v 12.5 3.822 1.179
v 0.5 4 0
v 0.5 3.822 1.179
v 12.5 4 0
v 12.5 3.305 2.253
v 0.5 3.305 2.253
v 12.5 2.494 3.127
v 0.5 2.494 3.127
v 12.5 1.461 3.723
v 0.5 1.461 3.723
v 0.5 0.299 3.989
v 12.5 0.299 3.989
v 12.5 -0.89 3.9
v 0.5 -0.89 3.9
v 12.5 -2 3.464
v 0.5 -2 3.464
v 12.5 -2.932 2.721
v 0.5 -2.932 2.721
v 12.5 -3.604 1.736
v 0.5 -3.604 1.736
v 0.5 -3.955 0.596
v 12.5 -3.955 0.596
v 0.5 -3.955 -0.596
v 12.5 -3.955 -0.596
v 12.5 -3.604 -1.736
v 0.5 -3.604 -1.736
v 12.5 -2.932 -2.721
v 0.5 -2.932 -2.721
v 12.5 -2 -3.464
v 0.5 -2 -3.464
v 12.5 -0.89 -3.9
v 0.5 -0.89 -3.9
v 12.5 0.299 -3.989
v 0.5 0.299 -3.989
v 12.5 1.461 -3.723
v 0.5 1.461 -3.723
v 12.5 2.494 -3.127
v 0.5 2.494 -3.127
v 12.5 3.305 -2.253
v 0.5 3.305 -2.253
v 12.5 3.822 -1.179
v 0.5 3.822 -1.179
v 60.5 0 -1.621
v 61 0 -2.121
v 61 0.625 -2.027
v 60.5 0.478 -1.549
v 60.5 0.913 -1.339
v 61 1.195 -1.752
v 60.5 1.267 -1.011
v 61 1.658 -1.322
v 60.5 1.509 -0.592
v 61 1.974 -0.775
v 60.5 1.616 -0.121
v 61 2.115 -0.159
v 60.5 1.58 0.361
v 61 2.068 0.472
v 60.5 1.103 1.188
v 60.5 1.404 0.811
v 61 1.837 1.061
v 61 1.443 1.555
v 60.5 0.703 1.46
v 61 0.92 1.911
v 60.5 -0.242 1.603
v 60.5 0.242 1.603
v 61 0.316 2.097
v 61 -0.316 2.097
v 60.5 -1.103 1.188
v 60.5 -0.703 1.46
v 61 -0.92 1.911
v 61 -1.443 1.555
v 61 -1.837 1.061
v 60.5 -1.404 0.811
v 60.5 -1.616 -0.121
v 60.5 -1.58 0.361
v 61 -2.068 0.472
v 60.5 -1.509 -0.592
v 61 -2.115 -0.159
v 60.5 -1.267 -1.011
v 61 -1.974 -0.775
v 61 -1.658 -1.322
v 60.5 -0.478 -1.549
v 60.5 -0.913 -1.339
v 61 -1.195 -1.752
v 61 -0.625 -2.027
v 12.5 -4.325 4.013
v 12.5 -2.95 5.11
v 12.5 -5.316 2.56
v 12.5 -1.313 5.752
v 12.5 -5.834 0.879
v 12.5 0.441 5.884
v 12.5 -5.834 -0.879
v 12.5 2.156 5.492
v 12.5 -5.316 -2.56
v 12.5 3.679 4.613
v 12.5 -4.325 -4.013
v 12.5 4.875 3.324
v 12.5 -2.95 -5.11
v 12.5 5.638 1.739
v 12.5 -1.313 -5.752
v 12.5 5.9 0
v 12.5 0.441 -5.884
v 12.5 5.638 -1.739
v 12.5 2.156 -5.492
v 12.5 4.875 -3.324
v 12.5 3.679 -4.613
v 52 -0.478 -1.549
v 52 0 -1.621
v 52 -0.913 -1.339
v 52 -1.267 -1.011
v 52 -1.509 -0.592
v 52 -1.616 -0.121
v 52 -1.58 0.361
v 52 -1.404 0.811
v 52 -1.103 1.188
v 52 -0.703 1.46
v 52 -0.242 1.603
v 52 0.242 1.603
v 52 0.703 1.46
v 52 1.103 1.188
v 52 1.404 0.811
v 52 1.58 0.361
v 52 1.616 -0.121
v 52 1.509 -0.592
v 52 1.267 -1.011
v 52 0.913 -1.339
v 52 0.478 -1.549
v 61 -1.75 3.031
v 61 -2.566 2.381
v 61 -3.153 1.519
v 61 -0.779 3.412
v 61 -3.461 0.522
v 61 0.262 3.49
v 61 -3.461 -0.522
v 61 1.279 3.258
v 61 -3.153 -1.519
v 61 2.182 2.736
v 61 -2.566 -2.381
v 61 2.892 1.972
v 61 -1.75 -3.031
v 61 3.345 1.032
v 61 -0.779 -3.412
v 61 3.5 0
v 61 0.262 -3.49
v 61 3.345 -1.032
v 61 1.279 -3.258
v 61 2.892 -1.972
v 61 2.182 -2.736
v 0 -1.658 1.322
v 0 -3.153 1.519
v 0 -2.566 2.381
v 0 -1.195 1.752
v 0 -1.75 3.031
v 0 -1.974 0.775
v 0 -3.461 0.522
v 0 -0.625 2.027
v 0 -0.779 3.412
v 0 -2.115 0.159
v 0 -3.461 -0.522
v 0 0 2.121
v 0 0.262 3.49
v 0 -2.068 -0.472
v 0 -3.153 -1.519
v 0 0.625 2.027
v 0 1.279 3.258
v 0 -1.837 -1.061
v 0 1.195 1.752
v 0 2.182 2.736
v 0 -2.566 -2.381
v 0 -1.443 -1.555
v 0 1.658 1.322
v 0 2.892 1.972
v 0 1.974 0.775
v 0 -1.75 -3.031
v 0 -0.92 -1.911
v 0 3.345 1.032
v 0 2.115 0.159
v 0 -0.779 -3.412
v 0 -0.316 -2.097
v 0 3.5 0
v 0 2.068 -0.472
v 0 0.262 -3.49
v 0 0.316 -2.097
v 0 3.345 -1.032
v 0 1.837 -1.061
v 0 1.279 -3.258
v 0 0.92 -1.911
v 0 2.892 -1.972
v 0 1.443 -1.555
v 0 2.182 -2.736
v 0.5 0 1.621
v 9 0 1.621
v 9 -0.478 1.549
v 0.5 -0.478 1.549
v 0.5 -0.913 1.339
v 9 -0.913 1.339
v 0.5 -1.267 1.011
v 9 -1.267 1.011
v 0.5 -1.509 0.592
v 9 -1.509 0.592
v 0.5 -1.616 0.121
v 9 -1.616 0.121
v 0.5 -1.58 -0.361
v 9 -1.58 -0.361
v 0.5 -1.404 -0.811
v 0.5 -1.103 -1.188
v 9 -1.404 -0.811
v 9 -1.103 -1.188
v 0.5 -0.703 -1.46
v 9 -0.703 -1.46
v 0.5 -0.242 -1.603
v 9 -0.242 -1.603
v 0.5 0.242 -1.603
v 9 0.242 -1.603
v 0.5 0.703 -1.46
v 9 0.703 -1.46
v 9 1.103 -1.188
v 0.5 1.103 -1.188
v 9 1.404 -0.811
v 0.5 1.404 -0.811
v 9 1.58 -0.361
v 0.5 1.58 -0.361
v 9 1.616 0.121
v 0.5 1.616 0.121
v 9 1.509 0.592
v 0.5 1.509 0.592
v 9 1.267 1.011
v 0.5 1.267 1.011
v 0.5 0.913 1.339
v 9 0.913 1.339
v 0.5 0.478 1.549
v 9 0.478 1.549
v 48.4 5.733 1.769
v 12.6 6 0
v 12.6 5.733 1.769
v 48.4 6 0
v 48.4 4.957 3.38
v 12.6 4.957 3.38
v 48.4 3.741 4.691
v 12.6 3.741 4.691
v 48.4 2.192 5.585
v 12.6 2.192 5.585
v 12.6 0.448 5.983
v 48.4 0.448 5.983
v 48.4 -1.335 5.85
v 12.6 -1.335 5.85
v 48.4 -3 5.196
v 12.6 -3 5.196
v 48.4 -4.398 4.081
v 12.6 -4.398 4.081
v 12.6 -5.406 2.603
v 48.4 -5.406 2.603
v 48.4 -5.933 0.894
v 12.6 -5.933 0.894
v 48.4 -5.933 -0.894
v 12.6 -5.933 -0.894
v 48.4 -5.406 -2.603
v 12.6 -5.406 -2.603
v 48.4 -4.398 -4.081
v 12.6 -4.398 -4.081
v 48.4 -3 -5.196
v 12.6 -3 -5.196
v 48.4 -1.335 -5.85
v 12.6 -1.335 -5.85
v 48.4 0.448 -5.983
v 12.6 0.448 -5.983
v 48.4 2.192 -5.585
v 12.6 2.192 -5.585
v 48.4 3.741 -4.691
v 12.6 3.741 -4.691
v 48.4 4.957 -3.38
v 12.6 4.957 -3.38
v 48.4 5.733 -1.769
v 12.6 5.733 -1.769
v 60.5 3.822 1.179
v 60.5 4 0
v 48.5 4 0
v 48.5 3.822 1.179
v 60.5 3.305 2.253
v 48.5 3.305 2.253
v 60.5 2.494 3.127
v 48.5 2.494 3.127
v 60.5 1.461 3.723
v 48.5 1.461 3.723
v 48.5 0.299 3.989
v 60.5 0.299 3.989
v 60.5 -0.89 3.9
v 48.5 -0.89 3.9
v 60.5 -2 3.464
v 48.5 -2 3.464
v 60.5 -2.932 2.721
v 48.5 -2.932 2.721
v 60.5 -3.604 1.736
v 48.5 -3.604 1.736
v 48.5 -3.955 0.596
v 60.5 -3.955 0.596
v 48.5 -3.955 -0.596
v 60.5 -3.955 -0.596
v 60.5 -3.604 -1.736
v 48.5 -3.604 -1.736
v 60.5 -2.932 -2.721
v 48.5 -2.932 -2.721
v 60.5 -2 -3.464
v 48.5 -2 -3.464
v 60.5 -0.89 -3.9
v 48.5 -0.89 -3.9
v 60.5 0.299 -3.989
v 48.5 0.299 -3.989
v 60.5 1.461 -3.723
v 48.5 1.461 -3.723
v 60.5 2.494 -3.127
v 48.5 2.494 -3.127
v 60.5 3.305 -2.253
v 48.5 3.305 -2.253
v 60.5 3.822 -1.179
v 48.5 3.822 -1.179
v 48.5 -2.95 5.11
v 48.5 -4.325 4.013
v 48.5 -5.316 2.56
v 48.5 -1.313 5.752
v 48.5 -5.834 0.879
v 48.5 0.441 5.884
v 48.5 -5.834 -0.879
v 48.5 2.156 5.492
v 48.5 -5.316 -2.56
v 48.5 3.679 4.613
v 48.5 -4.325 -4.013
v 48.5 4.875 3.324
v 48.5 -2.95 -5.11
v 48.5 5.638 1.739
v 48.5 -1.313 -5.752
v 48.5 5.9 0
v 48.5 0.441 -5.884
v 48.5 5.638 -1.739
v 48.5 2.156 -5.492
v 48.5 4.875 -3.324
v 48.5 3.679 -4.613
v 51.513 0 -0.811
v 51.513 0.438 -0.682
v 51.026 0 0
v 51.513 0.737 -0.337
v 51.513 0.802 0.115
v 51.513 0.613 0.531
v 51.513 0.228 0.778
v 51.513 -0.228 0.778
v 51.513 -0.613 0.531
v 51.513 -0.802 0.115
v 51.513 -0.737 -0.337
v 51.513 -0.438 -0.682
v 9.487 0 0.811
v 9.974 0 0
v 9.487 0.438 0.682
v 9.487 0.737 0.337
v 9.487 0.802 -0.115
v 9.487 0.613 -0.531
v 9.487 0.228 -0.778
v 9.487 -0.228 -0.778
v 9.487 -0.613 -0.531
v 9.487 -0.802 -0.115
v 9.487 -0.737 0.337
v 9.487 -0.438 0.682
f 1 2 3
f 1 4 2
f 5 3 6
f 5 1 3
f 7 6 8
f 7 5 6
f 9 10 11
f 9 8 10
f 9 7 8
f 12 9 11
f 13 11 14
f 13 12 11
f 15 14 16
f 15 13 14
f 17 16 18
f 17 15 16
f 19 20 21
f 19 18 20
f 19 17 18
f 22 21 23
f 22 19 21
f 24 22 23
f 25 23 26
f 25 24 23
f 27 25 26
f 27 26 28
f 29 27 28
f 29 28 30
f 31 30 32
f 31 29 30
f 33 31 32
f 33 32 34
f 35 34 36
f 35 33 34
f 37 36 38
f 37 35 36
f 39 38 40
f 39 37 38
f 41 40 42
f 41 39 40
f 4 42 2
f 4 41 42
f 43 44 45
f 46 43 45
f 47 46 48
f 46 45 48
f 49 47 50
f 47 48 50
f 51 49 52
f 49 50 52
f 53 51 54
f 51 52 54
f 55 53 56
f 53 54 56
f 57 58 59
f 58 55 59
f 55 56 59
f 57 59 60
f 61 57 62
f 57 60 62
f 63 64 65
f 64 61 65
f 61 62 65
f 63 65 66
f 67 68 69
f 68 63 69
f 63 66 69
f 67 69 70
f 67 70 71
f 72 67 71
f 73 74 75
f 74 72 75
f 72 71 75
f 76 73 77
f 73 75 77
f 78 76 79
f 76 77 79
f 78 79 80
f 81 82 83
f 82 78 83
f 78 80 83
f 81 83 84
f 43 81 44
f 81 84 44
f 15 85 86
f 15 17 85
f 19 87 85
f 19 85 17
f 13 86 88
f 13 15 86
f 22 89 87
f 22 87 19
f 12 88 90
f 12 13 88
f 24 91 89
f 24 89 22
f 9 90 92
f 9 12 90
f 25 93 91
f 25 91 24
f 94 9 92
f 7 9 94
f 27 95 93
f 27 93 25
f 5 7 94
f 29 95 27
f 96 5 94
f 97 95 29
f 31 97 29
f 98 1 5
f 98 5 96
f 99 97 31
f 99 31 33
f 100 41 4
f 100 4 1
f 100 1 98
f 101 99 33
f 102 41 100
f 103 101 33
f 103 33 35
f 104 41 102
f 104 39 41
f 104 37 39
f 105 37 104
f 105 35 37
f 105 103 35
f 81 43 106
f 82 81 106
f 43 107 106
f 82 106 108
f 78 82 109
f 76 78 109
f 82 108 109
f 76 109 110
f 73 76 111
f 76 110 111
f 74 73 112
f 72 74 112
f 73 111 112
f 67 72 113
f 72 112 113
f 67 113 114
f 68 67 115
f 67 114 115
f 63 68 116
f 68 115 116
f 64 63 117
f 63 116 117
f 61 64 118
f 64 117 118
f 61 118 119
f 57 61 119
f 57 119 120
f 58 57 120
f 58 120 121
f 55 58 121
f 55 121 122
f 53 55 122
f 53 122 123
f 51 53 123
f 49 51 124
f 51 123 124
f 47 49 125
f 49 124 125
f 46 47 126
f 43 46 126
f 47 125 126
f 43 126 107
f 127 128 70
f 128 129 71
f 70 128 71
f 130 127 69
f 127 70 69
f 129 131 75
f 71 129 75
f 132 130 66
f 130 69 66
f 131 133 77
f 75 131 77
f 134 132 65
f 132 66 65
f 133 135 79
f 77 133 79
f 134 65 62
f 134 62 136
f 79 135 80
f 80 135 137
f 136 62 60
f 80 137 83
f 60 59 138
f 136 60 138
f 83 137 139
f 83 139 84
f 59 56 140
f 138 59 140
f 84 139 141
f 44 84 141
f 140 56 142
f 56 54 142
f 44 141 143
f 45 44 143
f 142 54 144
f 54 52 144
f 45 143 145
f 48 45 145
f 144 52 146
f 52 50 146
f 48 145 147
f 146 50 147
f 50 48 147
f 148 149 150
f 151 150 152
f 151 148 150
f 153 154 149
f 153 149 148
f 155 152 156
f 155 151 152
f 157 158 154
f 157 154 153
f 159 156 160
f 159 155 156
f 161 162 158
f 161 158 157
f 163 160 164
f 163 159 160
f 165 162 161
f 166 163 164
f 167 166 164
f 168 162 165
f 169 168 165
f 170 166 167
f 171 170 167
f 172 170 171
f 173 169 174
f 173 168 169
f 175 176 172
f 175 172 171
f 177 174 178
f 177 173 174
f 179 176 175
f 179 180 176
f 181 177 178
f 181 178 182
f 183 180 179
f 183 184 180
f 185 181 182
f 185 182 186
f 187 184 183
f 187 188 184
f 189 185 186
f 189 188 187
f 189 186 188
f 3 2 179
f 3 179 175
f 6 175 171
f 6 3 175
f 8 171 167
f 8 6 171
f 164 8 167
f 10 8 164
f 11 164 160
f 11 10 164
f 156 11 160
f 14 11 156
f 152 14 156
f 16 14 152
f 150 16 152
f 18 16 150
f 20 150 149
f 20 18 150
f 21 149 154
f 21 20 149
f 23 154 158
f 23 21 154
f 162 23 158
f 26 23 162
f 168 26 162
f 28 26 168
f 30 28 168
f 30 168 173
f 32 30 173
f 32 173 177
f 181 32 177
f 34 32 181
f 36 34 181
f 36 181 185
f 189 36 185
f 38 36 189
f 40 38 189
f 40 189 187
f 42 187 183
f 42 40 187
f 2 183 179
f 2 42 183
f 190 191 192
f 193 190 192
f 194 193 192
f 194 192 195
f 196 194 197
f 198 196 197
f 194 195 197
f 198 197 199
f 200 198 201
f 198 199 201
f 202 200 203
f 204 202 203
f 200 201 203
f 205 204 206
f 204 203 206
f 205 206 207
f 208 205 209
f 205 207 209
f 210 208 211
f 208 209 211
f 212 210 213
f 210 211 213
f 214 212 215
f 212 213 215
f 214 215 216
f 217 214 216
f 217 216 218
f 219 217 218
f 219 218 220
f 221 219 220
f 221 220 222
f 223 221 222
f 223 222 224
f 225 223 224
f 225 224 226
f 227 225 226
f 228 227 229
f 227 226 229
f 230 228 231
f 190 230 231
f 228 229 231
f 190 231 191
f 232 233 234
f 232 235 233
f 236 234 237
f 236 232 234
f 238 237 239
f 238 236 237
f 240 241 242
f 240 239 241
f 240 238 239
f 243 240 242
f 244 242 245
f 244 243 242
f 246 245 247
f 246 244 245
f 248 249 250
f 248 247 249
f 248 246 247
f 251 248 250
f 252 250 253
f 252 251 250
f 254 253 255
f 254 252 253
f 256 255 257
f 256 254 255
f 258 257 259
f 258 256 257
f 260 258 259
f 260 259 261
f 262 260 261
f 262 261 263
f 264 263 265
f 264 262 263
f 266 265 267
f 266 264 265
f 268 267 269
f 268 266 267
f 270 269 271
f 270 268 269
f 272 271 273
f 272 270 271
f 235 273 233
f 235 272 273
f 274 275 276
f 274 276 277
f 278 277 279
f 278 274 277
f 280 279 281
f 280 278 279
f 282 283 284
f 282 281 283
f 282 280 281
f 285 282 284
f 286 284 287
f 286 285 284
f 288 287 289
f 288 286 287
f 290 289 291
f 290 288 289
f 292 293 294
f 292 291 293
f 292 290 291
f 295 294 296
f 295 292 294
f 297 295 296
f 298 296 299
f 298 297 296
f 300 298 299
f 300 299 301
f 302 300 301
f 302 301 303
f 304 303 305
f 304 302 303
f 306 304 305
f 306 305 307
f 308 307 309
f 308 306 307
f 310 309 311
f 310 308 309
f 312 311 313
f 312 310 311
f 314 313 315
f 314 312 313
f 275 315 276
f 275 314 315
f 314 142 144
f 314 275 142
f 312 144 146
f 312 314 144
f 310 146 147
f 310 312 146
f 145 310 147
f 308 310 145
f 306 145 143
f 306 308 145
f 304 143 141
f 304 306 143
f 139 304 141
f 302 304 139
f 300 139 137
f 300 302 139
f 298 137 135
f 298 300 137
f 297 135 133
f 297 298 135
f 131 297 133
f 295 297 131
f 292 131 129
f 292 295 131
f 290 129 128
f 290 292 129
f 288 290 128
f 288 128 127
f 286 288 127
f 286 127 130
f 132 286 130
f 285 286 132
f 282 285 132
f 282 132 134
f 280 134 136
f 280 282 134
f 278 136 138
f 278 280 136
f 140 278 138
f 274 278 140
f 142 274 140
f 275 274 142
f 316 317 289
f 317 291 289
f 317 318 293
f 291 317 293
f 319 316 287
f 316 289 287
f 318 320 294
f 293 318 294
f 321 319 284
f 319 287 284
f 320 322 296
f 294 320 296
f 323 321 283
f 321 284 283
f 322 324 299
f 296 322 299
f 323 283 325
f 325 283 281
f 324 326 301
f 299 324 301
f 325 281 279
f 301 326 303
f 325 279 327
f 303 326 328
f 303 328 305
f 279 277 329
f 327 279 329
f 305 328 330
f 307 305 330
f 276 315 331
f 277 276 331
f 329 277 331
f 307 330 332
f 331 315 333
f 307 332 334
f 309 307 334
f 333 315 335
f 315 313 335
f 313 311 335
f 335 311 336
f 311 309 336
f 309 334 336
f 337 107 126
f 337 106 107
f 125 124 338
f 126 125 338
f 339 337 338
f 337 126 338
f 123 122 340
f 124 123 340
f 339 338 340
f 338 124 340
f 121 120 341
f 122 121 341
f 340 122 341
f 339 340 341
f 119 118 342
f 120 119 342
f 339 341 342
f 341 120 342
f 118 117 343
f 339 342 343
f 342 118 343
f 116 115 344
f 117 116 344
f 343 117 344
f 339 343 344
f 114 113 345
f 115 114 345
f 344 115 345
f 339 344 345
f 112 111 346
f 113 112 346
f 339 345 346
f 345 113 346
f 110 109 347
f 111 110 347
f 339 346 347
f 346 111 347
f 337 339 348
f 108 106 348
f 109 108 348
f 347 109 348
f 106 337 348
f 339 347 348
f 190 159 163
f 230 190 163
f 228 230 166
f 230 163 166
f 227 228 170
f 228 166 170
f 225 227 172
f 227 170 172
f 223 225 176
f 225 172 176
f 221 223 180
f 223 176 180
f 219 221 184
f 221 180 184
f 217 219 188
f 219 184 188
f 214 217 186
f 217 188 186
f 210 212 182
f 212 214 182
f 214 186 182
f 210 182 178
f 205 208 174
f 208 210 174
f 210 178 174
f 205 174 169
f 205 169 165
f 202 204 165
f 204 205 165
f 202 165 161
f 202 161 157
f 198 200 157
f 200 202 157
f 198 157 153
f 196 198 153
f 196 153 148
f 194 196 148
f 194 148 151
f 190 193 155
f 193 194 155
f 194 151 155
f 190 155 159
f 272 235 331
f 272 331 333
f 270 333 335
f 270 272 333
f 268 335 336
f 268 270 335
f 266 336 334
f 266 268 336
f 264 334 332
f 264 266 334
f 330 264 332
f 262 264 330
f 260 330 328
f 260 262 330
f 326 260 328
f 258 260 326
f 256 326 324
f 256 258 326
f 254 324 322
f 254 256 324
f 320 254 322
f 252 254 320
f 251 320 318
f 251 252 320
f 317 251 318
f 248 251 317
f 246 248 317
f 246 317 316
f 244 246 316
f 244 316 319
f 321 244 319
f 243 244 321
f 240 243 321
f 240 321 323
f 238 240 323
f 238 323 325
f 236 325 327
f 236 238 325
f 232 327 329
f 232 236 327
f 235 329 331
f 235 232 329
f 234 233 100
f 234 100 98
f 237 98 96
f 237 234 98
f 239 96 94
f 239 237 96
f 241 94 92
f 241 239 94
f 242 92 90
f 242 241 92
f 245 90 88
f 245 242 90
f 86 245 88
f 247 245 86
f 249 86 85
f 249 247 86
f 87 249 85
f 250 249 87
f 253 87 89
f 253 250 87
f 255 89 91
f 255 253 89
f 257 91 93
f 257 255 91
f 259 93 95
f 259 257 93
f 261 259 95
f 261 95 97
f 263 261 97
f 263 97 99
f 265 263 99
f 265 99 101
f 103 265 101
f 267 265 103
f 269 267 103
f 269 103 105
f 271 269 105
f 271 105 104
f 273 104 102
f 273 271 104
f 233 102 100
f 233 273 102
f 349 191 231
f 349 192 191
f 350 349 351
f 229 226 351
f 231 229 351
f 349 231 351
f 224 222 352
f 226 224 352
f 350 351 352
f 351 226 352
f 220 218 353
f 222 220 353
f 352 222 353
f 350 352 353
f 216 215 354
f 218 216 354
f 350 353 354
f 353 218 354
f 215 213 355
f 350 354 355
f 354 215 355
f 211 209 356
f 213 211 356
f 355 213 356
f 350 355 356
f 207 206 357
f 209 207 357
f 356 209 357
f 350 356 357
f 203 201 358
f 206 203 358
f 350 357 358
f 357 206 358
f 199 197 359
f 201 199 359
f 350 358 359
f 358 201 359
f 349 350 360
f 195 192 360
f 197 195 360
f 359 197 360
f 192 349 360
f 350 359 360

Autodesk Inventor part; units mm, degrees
ref_plane "YZ Plane" through (0, 0, 0) normal (1, 0, 0) x (0, 1, 0)
ref_plane "XZ Plane" through (0, 0, 0) normal (0, 1, 0) x (-1, 0, 0)
ref_plane "XY Plane" through (0, 0, 0) normal (0, 0, 1) x (1, 0, 0)
sketch "Skizze1" plane through (0, 0, 0) normal (0, 0, 1) x (1, 0, 0)
  line L0 (0, 0) -> (0, 4)
  line L1 (0, 4) -> (12.5, 4)
  line L2 (12.5, 4) -> (12.5, 6)
  line L3 (12.5, 6) -> (48.5, 6)
  line L4 (48.5, 6) -> (48.5, 4)
  line L5 (48.5, 4) -> (61, 4)
  line L6 (61, 4) -> (61, 0)
  line L7 (61, 0) -> (0, 0)
  dimension "d1" = 12.5
  dimension "d2" = 12.5
  dimension "d3" = 8
  dimension "d4" = 12
  dimension "d29" = 36
revolve "Umdrehung1" add sketch "Skizze1" angle 360 about axis through (61, 0, 0) along (-1, 0, 0)
sketch "Skizze2" plane through (0, 0, 0) normal (-1, 0, 0) x (0, 0, 1)
  point P0 (0, 0)
  point P1 (0, 0)
sketch "Skizze3" plane through (61, 0, 0) normal (1, 0, 0) x (0, 0, -1)
  point P0 (0, 0)
  point P1 (0, 0)
hole "Bohrung1" at (61, 0, 0) direction (-1, 0, 0) diameter 3.242 depth 9 tip angle 118 thread size "M4x0.7" class "6H" standard "ISO Metric profile"
hole "Bohrung2" at (0, 0, 0) direction (1, 0, 0) diameter 3.242 depth 9 tip angle 118 thread size "M4x0.7" class "6H" standard "ISO Metric profile"
chamfer "Fase1" distance 0.5 angle 45 4 edges at (0, -4, 0) (61, -4, 0) (61, 0, 1.621) (0, 0, -1.621)
chamfer "Fase2" distance 0.1 angle 45 2 edges at (48.5, -6, 0) (12.5, -6, 0)
ref_plane "Arbeitsebene1" through (30.5, 0, 0) normal (-1, 0, 0) x (0, 0, 1)
equation "\"d1\" = d2"
equation "\"d29\" = MainAxis_Schluesselweite + 2 * ParallelMecha_Bearing_Step_Thickness"
equation "\"ParallelLink_BearingStep_Height\" = 5"
equation "\"ParallelMech_Distance_Step2Flat\" = 14"
equation "\"ParallelLink_Lever_Thickness_1\" = 8"
equation "\"ParallelMecha_Bearing_Step_Thickness\" = 6"
equation "\"MainAxis_Schluesselweite\" = 24"
properties part number "ParallelSystem_ProximalPart_Querstreben_v2_Rillenkugellager" material "Edelstahl"
